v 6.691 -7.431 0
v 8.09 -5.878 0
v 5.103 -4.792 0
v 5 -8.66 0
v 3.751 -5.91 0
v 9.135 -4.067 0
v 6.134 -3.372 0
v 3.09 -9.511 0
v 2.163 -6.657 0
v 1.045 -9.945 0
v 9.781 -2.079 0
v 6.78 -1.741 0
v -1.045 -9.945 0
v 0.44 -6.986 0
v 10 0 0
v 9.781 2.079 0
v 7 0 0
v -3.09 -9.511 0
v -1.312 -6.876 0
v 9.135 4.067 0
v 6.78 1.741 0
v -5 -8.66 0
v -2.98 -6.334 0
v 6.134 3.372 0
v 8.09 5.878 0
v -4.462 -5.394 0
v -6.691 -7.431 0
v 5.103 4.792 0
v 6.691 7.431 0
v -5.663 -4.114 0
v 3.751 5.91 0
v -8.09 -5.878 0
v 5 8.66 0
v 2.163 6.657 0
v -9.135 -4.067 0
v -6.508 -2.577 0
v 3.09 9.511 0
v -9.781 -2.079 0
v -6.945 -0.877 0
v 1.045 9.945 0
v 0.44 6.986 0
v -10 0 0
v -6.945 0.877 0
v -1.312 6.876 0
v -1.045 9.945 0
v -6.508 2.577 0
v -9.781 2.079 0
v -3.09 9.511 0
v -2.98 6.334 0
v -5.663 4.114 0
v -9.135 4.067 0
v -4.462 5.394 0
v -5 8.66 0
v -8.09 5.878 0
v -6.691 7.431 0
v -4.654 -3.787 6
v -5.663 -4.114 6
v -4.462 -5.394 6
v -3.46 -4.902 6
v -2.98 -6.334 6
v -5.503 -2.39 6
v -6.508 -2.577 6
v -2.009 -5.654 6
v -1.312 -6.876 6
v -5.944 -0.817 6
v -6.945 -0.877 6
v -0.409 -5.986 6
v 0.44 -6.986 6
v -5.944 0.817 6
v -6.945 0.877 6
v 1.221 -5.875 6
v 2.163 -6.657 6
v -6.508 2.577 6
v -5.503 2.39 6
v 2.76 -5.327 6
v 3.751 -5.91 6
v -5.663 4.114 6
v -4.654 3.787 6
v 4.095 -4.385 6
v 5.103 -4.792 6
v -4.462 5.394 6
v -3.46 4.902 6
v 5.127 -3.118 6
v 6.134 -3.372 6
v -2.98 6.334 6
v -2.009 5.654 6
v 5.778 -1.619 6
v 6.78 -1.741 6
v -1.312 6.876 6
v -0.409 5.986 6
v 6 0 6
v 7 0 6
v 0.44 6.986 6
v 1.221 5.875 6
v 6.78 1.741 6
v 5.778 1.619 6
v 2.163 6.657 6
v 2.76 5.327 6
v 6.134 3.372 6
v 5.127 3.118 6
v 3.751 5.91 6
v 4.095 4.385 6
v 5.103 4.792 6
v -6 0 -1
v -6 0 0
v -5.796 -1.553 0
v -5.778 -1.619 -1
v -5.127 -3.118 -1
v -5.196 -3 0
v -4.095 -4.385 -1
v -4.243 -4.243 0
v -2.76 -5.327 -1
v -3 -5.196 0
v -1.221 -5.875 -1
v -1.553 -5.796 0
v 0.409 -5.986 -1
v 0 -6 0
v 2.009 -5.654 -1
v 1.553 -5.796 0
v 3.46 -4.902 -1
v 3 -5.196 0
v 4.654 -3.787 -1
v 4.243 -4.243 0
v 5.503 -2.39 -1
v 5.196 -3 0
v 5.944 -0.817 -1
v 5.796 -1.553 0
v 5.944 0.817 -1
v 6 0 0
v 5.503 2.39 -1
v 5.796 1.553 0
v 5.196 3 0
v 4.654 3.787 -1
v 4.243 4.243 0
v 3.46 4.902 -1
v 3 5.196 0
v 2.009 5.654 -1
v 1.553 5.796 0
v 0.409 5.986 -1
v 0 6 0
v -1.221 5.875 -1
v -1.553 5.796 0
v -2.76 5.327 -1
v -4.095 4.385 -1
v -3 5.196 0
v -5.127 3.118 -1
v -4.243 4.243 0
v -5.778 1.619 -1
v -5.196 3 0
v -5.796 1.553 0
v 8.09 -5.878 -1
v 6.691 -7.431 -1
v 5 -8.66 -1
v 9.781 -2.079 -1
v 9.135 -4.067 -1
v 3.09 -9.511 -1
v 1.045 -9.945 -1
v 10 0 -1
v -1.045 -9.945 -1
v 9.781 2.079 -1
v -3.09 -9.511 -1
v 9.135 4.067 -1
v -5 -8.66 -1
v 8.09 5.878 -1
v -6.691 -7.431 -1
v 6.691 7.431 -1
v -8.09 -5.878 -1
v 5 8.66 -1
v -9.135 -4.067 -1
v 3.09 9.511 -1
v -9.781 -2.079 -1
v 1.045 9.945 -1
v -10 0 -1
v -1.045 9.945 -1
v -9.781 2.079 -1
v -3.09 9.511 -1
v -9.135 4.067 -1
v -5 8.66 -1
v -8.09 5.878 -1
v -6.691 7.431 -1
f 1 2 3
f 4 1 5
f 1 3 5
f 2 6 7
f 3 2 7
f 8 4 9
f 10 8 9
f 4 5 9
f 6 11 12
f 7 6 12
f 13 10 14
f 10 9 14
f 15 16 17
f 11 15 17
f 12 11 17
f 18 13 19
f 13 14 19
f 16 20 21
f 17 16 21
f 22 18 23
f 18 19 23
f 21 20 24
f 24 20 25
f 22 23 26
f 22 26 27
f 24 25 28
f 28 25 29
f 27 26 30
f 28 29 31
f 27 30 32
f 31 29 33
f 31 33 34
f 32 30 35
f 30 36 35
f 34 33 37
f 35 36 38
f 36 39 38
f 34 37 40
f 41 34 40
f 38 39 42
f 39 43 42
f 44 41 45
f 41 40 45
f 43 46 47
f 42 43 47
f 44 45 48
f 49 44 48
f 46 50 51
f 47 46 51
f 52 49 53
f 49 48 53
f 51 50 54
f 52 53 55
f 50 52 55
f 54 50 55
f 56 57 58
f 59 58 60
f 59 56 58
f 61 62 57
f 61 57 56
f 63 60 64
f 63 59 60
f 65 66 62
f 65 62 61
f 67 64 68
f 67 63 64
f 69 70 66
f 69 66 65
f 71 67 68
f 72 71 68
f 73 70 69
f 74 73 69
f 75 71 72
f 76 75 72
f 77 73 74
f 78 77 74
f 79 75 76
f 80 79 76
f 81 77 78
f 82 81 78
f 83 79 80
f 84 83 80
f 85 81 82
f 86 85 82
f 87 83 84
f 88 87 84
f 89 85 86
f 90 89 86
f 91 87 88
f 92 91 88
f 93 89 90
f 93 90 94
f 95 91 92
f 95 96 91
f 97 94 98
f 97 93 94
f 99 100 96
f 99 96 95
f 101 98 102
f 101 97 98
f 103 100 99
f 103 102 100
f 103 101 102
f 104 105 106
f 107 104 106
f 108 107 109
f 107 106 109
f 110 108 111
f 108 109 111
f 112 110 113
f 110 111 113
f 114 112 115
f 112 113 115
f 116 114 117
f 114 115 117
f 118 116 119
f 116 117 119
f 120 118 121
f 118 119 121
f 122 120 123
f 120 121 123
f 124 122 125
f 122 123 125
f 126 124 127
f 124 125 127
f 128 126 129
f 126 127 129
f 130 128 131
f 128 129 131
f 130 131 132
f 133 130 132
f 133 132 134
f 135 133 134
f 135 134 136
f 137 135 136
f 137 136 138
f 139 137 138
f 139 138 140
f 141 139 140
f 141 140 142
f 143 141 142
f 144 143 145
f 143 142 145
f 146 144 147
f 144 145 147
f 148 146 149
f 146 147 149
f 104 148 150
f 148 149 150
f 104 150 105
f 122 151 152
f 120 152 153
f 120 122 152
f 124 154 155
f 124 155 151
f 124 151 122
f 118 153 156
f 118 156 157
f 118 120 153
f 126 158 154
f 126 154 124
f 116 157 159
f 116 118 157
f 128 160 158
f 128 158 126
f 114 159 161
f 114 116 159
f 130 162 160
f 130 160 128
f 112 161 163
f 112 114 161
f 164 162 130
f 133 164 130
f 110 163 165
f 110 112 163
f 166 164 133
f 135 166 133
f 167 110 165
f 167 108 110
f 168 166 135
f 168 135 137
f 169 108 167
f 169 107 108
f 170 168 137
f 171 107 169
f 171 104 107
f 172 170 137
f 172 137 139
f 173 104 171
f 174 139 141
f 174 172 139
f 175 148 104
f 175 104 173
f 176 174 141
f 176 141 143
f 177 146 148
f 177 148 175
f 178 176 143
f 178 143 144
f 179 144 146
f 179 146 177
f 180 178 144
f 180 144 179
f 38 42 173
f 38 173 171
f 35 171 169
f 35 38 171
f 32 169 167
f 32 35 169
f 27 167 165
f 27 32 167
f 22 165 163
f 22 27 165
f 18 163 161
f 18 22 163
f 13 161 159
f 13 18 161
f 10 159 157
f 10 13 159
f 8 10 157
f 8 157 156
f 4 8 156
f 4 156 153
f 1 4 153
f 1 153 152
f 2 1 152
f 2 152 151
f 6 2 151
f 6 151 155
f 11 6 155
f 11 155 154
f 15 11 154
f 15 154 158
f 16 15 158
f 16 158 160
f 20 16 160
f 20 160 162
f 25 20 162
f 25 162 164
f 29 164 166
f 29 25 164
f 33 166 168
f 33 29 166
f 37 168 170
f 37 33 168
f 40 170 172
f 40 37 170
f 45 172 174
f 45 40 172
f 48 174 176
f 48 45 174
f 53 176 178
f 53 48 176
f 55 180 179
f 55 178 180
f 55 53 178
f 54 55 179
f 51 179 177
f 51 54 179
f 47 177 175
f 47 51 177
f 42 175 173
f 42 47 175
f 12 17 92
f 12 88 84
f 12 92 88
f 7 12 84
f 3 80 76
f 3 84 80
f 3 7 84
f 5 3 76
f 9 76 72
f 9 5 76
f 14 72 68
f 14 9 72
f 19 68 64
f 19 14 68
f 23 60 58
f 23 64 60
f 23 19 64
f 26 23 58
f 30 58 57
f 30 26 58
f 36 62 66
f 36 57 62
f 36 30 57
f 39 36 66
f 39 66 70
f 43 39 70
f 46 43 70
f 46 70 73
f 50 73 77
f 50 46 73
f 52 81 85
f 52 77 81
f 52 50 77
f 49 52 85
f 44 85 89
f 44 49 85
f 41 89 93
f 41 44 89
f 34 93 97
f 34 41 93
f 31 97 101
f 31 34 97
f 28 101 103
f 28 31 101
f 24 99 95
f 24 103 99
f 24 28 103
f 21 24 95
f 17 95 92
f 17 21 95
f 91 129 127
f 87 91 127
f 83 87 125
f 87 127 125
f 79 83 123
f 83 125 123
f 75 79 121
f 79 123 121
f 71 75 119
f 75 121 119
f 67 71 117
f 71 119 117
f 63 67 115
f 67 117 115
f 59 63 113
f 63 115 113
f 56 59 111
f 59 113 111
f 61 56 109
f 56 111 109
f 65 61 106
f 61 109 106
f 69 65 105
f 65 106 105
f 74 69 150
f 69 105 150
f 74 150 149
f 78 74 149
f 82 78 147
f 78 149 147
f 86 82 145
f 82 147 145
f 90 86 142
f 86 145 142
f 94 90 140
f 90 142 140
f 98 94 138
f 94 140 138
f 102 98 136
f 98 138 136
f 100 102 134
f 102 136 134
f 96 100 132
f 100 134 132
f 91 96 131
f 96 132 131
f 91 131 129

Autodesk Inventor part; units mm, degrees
ref_plane "YZ Plane" through (0, 0, 0) normal (1, 0, 0) x (0, 1, 0)
ref_plane "XZ Plane" through (0, 0, 0) normal (0, 1, 0) x (-1, 0, 0)
ref_plane "XY Plane" through (0, 0, 0) normal (0, 0, 1) x (1, 0, 0)
sketch "スケッチ1" plane through (0, 0, 0) normal (0, 0, 1) x (1, 0, 0)
  circle A0 centre (0, 0) radius 6
  circle A1 centre (0, 0) radius 7
  dimension "d0" = 12
  dimension "d1" = 14
extrude "押し出し1" add sketch "スケッチ1" along normal blind 6
sketch "スケッチ2" plane through (0, 0, 0) normal (0, 0, -1) x (-1, 0, 0)
  circle A0 centre (0, 0) radius 7 projected
  circle A1 centre (0, 0) radius 6 projected
  circle A2 centre (0, 0) radius 10
  dimension "d4" = 20
extrude "押し出し2" add sketch "スケッチ2" along normal blind 1 contours A0 | A2
properties part number "オイレスフランジ付き12142006" material "アセタール樹脂、黒"
